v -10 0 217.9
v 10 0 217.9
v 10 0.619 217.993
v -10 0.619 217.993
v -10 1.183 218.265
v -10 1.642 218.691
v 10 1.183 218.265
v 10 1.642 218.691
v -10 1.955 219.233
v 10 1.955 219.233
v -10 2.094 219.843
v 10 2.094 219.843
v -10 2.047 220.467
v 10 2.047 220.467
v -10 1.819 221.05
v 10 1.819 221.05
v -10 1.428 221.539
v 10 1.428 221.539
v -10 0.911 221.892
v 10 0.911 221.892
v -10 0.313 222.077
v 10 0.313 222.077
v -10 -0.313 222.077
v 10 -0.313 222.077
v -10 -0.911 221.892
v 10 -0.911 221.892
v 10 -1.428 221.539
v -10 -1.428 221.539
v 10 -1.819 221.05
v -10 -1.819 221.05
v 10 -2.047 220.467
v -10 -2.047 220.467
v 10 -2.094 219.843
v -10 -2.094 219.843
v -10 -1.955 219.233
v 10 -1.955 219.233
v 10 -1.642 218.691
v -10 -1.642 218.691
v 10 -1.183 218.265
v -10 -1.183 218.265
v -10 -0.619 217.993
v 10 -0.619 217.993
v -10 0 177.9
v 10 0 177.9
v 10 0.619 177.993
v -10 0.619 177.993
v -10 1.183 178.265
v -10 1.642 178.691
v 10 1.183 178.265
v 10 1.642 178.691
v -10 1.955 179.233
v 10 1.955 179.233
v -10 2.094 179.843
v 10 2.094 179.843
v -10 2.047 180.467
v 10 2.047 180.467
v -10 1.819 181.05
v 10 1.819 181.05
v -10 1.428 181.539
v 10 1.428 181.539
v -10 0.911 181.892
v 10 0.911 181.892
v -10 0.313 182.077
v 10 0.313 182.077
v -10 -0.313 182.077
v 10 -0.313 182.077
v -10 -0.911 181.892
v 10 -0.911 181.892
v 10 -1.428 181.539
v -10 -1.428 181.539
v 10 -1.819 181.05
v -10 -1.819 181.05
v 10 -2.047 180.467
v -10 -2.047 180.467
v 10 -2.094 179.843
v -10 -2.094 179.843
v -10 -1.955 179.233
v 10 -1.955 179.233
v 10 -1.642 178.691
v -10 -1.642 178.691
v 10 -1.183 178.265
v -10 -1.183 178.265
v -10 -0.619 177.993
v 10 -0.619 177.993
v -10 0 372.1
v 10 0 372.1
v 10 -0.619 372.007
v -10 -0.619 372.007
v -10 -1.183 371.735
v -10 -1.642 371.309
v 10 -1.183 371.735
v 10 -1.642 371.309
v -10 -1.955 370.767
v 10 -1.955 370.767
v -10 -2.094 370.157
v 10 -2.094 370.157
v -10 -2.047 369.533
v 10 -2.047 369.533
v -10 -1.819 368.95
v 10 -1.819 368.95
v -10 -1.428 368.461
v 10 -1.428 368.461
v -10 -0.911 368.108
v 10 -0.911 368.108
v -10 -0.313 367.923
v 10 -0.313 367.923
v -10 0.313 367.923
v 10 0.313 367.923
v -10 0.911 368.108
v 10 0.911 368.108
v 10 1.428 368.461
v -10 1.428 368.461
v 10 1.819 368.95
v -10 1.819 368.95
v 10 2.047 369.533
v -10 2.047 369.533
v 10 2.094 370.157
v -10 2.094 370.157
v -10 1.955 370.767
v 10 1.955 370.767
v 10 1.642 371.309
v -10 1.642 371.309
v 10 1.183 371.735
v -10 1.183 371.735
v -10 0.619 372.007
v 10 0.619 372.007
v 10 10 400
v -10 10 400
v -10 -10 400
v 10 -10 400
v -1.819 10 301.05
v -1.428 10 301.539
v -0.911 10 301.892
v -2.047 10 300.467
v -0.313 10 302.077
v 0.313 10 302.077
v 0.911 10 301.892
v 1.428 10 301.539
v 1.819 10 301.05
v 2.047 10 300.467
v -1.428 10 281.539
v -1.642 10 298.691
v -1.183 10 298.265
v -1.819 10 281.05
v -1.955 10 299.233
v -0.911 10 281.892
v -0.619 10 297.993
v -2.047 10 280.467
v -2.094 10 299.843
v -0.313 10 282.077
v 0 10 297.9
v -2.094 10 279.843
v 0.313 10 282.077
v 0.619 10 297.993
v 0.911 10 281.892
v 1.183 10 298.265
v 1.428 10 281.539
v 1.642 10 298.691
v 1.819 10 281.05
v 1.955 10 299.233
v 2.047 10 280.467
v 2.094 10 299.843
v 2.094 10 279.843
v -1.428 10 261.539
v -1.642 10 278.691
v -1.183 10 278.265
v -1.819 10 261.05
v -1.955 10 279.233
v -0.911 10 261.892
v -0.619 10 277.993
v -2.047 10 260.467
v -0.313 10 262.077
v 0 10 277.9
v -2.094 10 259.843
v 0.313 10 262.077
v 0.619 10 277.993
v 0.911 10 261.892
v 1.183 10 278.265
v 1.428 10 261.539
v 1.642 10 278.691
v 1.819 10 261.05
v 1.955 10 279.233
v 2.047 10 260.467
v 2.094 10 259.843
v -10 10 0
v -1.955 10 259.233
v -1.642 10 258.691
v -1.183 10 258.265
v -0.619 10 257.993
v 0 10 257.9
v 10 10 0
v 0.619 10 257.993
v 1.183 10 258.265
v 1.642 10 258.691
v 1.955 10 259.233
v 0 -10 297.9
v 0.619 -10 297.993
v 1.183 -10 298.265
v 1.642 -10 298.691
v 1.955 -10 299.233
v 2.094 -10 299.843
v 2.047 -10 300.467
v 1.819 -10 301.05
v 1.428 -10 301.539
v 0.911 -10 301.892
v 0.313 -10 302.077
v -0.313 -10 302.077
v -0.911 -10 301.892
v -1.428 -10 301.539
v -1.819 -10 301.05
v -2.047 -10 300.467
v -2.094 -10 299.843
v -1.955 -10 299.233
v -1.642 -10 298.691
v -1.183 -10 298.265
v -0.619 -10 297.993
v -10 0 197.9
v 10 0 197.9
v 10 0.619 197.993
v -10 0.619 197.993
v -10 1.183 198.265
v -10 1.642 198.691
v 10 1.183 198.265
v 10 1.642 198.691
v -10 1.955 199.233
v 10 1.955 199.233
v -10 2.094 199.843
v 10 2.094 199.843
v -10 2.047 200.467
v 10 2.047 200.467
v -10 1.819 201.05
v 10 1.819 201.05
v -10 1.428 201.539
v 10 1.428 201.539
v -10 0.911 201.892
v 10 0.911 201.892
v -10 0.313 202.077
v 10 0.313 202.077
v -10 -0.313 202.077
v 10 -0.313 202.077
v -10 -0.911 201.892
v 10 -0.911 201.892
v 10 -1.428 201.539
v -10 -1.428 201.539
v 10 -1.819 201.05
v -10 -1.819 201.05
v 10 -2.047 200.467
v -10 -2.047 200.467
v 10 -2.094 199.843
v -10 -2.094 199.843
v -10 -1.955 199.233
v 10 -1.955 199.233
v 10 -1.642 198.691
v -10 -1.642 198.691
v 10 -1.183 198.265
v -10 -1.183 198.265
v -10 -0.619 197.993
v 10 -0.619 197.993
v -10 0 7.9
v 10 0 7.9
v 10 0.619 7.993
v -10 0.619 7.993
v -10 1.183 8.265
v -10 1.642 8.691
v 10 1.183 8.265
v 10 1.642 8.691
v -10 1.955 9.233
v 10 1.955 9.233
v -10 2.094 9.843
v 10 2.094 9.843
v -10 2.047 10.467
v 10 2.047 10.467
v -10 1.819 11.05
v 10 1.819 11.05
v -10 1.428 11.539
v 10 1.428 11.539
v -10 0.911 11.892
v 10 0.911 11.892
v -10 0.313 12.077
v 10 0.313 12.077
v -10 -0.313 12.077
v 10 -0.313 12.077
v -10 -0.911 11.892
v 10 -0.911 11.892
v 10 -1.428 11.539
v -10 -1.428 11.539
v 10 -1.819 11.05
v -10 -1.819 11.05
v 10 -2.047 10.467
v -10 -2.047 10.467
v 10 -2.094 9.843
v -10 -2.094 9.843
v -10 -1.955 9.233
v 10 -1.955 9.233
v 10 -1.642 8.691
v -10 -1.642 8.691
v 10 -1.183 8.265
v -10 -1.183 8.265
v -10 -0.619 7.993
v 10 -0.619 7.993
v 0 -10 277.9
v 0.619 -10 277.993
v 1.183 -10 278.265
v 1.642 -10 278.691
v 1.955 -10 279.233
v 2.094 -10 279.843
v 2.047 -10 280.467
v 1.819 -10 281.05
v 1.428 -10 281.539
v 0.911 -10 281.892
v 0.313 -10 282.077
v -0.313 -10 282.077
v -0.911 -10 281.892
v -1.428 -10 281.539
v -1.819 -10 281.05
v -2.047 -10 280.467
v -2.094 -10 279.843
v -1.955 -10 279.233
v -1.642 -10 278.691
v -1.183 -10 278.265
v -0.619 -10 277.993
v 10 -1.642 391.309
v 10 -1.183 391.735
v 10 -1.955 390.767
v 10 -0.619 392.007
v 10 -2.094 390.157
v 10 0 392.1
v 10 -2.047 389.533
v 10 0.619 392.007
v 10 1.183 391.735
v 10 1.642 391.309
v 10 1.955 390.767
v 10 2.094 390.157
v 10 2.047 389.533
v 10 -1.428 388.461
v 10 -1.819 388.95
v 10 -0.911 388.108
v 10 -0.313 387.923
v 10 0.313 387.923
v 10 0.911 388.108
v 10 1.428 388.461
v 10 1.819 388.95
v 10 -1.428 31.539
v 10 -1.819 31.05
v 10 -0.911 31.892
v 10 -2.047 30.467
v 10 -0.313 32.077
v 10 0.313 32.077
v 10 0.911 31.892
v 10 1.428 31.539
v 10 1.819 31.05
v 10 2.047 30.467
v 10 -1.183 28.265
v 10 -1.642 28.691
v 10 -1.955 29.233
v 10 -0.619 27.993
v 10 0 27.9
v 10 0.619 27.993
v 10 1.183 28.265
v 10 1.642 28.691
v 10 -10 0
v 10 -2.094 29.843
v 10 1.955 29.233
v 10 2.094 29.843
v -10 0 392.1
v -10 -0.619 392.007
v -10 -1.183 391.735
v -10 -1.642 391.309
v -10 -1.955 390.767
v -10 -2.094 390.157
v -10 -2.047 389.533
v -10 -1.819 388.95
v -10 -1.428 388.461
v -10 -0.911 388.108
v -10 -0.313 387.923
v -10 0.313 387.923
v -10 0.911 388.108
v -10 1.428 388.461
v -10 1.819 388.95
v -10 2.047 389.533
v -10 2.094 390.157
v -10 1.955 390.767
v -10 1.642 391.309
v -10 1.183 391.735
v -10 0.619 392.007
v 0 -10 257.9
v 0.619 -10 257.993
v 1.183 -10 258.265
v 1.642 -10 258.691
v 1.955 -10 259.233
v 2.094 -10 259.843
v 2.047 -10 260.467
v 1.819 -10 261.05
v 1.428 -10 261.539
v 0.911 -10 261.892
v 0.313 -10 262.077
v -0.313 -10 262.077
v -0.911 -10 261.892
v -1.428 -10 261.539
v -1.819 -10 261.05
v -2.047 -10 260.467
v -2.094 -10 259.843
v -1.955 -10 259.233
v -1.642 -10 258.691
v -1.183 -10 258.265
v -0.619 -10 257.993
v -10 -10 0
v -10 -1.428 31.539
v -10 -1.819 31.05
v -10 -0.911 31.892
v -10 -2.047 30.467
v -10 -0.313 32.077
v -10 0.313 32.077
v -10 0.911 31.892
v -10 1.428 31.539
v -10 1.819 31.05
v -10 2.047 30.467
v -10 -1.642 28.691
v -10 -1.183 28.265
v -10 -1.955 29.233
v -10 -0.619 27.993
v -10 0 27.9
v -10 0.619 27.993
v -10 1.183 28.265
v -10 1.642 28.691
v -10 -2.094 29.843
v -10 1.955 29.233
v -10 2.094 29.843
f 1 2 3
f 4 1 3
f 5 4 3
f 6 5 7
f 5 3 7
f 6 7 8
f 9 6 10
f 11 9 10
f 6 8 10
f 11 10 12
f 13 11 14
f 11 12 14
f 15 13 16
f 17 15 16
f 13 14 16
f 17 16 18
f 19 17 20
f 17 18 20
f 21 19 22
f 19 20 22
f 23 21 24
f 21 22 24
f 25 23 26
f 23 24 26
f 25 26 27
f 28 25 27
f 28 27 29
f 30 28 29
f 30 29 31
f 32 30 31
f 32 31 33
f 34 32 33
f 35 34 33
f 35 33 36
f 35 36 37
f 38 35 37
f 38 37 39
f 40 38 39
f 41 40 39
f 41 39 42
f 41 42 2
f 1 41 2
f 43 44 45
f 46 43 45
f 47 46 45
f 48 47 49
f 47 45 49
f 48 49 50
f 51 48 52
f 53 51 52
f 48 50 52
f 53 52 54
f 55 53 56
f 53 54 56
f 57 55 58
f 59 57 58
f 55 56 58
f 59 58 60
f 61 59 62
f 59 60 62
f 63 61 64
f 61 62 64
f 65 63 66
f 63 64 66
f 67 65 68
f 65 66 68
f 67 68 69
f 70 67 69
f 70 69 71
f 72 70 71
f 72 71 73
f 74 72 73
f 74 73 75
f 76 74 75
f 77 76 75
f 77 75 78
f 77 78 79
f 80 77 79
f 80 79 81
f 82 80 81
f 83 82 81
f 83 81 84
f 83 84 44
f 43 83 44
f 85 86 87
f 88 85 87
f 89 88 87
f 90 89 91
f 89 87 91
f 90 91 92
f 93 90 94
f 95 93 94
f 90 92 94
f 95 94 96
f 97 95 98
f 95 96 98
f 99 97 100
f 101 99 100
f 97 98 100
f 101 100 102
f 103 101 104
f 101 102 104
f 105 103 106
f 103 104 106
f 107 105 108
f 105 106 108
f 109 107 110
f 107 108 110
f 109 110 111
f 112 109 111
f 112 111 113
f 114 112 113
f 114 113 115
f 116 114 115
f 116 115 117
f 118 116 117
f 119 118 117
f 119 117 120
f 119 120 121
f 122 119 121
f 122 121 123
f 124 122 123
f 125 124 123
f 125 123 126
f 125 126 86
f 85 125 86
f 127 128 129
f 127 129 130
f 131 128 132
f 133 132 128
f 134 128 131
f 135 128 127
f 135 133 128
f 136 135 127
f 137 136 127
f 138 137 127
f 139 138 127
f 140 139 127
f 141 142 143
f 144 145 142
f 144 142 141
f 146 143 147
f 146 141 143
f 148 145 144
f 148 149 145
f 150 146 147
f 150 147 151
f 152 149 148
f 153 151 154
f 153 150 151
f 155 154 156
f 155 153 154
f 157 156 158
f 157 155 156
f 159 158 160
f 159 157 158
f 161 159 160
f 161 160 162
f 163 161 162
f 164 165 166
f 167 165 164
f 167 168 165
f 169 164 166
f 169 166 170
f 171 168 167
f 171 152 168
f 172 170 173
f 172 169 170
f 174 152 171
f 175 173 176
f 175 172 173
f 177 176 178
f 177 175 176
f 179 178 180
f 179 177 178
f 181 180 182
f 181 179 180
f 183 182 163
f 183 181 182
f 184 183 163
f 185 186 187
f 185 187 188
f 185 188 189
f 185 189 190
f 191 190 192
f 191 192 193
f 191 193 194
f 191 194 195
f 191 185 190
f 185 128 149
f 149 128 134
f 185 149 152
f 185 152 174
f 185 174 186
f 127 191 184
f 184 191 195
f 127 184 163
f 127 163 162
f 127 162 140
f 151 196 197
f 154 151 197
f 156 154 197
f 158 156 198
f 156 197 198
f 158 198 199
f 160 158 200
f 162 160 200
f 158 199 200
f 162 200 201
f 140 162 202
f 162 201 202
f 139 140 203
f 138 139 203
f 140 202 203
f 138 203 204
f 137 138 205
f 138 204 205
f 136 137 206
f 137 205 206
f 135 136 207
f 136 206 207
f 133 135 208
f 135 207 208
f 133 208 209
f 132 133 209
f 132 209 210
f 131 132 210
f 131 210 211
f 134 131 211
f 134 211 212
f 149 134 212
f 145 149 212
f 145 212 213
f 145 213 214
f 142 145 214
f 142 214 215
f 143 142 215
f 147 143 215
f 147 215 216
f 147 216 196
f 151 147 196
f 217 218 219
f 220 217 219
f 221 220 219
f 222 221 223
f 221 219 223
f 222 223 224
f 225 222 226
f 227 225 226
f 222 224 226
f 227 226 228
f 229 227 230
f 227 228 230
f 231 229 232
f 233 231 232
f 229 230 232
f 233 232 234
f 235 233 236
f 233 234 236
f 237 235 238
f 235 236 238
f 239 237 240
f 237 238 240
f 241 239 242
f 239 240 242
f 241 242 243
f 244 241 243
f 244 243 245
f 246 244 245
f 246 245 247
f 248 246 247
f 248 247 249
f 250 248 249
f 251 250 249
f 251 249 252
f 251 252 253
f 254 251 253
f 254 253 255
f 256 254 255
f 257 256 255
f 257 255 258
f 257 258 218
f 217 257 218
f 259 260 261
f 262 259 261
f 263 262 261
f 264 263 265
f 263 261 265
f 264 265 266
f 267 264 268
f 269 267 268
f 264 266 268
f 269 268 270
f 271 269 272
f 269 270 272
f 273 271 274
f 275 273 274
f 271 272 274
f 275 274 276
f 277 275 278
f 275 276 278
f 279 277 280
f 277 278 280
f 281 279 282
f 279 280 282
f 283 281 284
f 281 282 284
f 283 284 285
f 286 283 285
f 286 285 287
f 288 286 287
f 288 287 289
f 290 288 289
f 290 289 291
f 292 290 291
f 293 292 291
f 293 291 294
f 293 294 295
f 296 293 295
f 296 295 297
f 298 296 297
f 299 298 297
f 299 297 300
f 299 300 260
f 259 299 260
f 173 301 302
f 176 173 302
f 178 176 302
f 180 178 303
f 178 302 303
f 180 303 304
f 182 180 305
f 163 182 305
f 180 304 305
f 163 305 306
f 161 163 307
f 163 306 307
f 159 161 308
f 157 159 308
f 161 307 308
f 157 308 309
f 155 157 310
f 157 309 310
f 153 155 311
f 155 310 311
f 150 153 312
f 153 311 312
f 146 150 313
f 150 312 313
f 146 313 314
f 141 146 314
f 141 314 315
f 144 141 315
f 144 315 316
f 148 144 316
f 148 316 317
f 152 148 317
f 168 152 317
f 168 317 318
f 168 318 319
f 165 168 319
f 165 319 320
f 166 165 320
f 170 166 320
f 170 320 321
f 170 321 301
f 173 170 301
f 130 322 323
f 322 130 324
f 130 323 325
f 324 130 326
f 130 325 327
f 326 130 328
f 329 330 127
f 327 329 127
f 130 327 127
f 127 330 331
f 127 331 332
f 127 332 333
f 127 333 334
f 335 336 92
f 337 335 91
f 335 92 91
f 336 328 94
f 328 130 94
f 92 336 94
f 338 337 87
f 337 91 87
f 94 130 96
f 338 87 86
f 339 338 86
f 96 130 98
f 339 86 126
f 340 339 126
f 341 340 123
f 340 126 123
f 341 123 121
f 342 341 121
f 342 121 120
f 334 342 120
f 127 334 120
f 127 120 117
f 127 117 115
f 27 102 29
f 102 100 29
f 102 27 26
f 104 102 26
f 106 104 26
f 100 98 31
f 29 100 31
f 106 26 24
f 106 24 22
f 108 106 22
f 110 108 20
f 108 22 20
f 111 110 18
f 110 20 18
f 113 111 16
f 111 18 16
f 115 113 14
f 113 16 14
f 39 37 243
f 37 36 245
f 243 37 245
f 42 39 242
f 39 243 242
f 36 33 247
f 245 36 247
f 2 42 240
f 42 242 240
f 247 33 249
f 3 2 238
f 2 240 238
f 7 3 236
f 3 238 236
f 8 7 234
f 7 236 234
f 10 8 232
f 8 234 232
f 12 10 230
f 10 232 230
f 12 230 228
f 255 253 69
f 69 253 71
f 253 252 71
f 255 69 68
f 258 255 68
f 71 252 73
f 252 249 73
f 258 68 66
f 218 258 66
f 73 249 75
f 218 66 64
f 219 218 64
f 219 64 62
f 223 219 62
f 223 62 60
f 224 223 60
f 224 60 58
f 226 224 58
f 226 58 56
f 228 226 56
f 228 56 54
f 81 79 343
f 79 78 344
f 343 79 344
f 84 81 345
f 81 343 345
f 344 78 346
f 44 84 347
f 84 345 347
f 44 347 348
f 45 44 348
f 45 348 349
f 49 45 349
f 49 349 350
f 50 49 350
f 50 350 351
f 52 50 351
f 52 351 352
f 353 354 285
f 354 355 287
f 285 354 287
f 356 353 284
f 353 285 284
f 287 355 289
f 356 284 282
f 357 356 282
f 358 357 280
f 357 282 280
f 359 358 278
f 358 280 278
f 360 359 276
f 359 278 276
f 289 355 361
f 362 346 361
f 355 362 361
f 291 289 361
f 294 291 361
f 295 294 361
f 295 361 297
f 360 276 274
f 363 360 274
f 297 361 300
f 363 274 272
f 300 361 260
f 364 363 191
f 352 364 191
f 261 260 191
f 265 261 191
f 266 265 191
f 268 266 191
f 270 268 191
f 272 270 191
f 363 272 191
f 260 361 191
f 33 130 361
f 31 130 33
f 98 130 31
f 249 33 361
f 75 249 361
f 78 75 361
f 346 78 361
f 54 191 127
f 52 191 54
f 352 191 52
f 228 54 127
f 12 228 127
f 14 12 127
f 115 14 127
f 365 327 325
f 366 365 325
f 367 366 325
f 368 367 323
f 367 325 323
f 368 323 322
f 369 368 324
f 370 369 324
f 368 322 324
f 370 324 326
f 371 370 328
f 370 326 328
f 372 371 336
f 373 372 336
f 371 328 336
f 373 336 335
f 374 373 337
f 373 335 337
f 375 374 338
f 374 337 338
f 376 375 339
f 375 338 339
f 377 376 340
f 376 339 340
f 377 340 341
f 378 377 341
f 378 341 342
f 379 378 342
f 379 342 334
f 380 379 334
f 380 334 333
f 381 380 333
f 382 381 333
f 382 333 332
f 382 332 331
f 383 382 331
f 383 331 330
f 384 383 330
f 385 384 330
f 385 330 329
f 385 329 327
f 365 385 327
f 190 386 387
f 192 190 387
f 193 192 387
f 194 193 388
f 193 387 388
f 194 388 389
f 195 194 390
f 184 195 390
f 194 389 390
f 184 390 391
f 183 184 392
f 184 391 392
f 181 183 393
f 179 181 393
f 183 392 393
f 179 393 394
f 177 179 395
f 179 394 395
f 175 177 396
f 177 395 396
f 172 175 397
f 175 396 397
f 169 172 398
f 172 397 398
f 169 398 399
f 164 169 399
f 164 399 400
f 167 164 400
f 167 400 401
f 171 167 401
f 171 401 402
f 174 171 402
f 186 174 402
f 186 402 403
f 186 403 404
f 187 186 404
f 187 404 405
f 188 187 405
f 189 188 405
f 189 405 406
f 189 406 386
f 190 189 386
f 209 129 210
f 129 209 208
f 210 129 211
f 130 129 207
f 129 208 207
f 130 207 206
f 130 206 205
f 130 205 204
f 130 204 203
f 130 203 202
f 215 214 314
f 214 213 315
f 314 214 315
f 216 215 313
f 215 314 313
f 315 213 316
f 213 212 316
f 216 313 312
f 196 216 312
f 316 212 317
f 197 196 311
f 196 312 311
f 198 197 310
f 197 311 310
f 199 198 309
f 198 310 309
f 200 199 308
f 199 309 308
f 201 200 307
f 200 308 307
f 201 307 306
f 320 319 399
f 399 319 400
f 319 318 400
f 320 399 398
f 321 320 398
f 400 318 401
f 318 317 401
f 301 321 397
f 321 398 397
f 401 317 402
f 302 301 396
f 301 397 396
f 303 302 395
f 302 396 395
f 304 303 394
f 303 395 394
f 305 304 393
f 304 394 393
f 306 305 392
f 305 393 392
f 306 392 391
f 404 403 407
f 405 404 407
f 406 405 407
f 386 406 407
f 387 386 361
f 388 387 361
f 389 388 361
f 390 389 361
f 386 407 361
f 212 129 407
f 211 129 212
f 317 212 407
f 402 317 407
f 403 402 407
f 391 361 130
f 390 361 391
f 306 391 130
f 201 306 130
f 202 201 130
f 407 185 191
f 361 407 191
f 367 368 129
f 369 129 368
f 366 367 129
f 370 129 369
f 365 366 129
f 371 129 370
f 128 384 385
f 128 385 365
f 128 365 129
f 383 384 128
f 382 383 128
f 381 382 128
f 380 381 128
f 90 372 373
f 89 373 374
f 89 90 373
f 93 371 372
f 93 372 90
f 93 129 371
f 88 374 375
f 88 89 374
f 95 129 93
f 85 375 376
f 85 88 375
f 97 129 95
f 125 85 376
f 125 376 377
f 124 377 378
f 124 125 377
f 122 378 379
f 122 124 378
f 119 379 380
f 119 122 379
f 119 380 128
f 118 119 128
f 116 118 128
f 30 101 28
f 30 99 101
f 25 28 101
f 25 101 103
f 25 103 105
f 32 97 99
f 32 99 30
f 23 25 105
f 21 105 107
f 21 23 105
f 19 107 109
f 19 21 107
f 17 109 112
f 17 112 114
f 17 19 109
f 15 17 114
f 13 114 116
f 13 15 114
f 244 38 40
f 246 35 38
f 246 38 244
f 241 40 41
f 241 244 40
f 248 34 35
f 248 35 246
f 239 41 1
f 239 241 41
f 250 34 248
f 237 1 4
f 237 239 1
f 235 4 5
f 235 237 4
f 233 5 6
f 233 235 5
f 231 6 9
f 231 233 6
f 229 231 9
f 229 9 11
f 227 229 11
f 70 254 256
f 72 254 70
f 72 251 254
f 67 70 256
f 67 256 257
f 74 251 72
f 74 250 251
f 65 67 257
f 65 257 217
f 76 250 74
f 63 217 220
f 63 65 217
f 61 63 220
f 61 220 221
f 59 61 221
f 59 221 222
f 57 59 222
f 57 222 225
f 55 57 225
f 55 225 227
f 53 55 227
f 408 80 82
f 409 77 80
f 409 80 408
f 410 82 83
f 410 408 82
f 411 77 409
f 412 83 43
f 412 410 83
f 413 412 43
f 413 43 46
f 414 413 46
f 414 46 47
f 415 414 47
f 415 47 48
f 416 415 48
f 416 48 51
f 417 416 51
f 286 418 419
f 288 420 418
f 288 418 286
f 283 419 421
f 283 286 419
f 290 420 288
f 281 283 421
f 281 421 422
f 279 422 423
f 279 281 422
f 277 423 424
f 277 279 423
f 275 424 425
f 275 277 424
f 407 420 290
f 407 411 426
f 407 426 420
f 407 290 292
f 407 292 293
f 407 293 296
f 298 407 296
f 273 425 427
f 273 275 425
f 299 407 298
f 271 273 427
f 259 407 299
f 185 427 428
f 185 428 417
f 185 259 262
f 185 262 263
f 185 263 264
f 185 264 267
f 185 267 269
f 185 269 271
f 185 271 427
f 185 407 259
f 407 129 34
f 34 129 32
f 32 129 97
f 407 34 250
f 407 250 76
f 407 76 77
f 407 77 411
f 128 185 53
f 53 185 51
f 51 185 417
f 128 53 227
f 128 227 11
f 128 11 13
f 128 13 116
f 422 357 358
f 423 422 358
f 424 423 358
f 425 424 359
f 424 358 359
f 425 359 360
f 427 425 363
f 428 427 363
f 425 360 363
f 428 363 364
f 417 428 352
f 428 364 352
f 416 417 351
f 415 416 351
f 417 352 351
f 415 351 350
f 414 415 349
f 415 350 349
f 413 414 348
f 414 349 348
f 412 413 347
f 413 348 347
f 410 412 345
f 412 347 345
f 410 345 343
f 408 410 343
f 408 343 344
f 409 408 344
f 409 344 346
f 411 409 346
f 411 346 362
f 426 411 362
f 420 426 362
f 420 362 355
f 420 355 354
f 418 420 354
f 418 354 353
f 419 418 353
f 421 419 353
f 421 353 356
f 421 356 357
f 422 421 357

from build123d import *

# Parameters (mm, degrees)
SKETCH_1_W          = 20
SKETCH_1_H          = 20
EXTRUDE_1_DEPTH     = 400
SKETCH_2_R          = 2.1
CUT_EXTRUDE_1_DEPTH = 401.62451248
SKETCH_3_R          = 2.1
CUT_EXTRUDE_2_DEPTH = 401.62451248
SKETCH_4_R          = 2.1
CUT_EXTRUDE_3_DEPTH = 401.62451248


with BuildPart() as part:
    # 草图1 → 凸台-拉伸1 (new body)
    with BuildSketch(Plane.XY):
        Rectangle(SKETCH_1_W, SKETCH_1_H)
    extrude(amount=EXTRUDE_1_DEPTH)

    # 草图2 → 切除-拉伸1 (cut, through all)
    with BuildSketch(Plane(origin=(10, 0, 0), x_dir=(0, 0, -1), z_dir=(1, 0, 0))):
        with Locations((-10, 0)):
            Circle(SKETCH_2_R)
        with Locations((-30, 0)):
            Circle(SKETCH_2_R)
        with Locations(Location((-390, 0, 0), (0, 0, 180))):
            Circle(SKETCH_2_R)
        with Locations(Location((-370, 0, 0), (0, 0, 180))):
            Circle(SKETCH_2_R)
    extrude(amount=-CUT_EXTRUDE_1_DEPTH, mode=Mode.SUBTRACT)

    # 草图3 → 切除-拉伸2 (cut, through all)
    with BuildSketch(Plane(origin=(10, 0, 0), x_dir=(0, 0, -1), z_dir=(1, 0, 0))):
        with Locations((-220, 0)):
            Circle(SKETCH_3_R)
        with Locations((-200, 0)):
            Circle(SKETCH_3_R)
        with Locations((-180, 0)):
            Circle(SKETCH_3_R)
    extrude(amount=-CUT_EXTRUDE_2_DEPTH, mode=Mode.SUBTRACT)

    # 草图4 → 切除-拉伸3 (cut, through all)
    with BuildSketch(Plane.XZ.offset(10)):
        with Locations(Location((0, 300, 0), (0, 0, 270))):
            Circle(SKETCH_4_R)
        with Locations(Location((0, 280, 0), (0, 0, 270))):
            Circle(SKETCH_4_R)
        with Locations(Location((0, 260, 0), (0, 0, 270))):
            Circle(SKETCH_4_R)
    extrude(amount=-CUT_EXTRUDE_3_DEPTH, mode=Mode.SUBTRACT)


solid = part.part
